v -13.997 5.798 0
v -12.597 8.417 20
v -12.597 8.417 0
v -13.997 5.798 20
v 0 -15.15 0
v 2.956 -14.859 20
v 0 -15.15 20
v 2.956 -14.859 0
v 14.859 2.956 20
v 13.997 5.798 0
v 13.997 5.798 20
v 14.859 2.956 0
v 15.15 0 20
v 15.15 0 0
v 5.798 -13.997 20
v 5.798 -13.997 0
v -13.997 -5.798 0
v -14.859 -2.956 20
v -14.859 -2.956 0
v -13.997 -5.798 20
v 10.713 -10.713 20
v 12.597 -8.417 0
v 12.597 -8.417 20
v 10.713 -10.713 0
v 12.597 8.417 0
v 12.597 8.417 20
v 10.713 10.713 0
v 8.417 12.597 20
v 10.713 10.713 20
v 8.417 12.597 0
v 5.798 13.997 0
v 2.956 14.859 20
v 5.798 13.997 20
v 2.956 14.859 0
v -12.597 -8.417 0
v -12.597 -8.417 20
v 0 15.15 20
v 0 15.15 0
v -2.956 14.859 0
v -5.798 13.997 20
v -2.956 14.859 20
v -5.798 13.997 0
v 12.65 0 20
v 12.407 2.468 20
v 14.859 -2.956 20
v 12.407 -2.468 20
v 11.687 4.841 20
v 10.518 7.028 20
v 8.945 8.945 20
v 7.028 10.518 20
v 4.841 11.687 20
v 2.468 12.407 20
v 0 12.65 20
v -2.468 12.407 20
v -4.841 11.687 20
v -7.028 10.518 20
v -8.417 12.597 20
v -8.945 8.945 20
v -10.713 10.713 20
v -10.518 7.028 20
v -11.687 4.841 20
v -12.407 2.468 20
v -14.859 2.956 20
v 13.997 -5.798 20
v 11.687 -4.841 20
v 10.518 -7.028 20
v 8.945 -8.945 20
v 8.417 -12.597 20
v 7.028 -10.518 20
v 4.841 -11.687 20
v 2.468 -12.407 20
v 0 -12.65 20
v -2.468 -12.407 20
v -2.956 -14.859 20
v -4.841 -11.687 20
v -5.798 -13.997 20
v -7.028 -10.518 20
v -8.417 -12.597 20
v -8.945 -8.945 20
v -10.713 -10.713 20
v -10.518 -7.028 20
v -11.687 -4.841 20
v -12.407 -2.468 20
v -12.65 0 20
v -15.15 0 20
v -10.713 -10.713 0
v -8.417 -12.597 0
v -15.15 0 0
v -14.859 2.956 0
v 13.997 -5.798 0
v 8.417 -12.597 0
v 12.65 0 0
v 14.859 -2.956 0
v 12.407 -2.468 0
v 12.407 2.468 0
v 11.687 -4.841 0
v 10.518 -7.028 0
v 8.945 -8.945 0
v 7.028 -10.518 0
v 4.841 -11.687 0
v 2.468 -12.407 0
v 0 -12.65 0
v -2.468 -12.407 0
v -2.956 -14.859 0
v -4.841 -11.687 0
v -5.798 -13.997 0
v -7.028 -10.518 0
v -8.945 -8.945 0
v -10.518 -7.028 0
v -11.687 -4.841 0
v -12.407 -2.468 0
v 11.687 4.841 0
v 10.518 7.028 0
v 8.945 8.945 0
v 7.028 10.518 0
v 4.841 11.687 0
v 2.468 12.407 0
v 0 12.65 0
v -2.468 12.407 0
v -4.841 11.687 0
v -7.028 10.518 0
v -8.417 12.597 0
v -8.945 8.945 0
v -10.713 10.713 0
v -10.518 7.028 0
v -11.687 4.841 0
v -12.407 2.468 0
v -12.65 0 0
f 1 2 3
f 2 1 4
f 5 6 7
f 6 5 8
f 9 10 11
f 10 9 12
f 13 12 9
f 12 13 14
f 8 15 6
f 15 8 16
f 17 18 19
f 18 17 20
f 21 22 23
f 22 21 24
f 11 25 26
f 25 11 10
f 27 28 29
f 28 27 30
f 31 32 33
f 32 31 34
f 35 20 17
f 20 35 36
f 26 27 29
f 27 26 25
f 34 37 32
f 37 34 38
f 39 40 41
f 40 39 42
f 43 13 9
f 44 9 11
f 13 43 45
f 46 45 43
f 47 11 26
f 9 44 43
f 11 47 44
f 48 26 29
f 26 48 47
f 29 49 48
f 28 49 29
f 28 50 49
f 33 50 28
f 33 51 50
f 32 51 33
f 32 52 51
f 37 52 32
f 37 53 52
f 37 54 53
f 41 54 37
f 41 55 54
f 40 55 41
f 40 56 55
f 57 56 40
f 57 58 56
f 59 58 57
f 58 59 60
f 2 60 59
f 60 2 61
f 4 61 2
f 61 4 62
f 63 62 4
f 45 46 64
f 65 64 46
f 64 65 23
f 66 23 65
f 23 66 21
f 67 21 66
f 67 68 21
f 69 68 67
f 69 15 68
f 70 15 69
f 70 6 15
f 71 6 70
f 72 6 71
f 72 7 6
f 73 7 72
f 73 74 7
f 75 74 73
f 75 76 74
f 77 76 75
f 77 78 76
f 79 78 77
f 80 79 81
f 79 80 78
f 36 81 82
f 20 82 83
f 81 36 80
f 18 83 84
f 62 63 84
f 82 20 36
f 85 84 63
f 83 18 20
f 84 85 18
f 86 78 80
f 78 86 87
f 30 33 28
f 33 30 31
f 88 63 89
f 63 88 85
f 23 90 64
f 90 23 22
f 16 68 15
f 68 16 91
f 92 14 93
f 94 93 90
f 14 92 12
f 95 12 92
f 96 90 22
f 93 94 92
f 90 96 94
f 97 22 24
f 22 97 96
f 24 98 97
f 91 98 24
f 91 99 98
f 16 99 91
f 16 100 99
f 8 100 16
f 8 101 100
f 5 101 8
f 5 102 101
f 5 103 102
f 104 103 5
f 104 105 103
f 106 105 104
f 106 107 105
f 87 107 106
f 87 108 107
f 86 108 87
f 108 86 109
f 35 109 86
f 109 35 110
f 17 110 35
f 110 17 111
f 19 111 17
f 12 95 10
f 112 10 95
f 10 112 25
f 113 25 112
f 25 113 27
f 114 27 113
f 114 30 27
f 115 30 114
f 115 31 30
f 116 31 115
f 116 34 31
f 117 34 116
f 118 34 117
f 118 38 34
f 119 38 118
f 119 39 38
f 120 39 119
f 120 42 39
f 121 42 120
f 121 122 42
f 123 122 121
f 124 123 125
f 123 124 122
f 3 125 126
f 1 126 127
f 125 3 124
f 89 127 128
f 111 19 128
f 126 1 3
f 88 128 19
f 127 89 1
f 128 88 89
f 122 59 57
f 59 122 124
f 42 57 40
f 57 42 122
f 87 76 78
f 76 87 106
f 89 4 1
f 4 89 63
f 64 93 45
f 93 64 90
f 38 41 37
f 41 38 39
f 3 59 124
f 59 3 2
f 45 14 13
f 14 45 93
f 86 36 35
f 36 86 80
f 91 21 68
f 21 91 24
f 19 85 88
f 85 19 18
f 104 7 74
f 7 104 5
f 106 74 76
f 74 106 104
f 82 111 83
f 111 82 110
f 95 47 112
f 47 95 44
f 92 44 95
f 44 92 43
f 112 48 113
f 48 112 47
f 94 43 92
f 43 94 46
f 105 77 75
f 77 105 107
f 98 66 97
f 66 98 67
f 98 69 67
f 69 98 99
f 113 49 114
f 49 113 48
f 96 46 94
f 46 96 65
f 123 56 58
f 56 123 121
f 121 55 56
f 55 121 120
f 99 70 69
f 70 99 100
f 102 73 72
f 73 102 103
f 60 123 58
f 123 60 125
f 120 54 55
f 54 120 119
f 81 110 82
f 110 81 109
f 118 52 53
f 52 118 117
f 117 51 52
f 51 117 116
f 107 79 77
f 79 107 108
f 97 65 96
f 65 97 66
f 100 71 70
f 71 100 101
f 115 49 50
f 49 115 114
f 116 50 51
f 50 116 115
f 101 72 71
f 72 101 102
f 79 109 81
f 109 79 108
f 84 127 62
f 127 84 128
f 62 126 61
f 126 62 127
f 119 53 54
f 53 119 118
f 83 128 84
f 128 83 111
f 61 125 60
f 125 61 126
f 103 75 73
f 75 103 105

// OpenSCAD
$fn = 32;

// ----------------------------------------------------------------------
// Spacer sleeve: 30.3 / 25.3 x 20 mm
// ----------------------------------------------------------------------

// --- parameters (mm) ---
tube_d = 30.3;            // outside diameter
bore_d = 25.3;            // shaft bore
tube_l = 20;              // sleeve length

module sleeve() {
  cylinder(h = tube_l, d = tube_d);
}

difference() {
  sleeve();
  translate([0, 0, -1]) cylinder(h = tube_l + 2, d = bore_d);
}
